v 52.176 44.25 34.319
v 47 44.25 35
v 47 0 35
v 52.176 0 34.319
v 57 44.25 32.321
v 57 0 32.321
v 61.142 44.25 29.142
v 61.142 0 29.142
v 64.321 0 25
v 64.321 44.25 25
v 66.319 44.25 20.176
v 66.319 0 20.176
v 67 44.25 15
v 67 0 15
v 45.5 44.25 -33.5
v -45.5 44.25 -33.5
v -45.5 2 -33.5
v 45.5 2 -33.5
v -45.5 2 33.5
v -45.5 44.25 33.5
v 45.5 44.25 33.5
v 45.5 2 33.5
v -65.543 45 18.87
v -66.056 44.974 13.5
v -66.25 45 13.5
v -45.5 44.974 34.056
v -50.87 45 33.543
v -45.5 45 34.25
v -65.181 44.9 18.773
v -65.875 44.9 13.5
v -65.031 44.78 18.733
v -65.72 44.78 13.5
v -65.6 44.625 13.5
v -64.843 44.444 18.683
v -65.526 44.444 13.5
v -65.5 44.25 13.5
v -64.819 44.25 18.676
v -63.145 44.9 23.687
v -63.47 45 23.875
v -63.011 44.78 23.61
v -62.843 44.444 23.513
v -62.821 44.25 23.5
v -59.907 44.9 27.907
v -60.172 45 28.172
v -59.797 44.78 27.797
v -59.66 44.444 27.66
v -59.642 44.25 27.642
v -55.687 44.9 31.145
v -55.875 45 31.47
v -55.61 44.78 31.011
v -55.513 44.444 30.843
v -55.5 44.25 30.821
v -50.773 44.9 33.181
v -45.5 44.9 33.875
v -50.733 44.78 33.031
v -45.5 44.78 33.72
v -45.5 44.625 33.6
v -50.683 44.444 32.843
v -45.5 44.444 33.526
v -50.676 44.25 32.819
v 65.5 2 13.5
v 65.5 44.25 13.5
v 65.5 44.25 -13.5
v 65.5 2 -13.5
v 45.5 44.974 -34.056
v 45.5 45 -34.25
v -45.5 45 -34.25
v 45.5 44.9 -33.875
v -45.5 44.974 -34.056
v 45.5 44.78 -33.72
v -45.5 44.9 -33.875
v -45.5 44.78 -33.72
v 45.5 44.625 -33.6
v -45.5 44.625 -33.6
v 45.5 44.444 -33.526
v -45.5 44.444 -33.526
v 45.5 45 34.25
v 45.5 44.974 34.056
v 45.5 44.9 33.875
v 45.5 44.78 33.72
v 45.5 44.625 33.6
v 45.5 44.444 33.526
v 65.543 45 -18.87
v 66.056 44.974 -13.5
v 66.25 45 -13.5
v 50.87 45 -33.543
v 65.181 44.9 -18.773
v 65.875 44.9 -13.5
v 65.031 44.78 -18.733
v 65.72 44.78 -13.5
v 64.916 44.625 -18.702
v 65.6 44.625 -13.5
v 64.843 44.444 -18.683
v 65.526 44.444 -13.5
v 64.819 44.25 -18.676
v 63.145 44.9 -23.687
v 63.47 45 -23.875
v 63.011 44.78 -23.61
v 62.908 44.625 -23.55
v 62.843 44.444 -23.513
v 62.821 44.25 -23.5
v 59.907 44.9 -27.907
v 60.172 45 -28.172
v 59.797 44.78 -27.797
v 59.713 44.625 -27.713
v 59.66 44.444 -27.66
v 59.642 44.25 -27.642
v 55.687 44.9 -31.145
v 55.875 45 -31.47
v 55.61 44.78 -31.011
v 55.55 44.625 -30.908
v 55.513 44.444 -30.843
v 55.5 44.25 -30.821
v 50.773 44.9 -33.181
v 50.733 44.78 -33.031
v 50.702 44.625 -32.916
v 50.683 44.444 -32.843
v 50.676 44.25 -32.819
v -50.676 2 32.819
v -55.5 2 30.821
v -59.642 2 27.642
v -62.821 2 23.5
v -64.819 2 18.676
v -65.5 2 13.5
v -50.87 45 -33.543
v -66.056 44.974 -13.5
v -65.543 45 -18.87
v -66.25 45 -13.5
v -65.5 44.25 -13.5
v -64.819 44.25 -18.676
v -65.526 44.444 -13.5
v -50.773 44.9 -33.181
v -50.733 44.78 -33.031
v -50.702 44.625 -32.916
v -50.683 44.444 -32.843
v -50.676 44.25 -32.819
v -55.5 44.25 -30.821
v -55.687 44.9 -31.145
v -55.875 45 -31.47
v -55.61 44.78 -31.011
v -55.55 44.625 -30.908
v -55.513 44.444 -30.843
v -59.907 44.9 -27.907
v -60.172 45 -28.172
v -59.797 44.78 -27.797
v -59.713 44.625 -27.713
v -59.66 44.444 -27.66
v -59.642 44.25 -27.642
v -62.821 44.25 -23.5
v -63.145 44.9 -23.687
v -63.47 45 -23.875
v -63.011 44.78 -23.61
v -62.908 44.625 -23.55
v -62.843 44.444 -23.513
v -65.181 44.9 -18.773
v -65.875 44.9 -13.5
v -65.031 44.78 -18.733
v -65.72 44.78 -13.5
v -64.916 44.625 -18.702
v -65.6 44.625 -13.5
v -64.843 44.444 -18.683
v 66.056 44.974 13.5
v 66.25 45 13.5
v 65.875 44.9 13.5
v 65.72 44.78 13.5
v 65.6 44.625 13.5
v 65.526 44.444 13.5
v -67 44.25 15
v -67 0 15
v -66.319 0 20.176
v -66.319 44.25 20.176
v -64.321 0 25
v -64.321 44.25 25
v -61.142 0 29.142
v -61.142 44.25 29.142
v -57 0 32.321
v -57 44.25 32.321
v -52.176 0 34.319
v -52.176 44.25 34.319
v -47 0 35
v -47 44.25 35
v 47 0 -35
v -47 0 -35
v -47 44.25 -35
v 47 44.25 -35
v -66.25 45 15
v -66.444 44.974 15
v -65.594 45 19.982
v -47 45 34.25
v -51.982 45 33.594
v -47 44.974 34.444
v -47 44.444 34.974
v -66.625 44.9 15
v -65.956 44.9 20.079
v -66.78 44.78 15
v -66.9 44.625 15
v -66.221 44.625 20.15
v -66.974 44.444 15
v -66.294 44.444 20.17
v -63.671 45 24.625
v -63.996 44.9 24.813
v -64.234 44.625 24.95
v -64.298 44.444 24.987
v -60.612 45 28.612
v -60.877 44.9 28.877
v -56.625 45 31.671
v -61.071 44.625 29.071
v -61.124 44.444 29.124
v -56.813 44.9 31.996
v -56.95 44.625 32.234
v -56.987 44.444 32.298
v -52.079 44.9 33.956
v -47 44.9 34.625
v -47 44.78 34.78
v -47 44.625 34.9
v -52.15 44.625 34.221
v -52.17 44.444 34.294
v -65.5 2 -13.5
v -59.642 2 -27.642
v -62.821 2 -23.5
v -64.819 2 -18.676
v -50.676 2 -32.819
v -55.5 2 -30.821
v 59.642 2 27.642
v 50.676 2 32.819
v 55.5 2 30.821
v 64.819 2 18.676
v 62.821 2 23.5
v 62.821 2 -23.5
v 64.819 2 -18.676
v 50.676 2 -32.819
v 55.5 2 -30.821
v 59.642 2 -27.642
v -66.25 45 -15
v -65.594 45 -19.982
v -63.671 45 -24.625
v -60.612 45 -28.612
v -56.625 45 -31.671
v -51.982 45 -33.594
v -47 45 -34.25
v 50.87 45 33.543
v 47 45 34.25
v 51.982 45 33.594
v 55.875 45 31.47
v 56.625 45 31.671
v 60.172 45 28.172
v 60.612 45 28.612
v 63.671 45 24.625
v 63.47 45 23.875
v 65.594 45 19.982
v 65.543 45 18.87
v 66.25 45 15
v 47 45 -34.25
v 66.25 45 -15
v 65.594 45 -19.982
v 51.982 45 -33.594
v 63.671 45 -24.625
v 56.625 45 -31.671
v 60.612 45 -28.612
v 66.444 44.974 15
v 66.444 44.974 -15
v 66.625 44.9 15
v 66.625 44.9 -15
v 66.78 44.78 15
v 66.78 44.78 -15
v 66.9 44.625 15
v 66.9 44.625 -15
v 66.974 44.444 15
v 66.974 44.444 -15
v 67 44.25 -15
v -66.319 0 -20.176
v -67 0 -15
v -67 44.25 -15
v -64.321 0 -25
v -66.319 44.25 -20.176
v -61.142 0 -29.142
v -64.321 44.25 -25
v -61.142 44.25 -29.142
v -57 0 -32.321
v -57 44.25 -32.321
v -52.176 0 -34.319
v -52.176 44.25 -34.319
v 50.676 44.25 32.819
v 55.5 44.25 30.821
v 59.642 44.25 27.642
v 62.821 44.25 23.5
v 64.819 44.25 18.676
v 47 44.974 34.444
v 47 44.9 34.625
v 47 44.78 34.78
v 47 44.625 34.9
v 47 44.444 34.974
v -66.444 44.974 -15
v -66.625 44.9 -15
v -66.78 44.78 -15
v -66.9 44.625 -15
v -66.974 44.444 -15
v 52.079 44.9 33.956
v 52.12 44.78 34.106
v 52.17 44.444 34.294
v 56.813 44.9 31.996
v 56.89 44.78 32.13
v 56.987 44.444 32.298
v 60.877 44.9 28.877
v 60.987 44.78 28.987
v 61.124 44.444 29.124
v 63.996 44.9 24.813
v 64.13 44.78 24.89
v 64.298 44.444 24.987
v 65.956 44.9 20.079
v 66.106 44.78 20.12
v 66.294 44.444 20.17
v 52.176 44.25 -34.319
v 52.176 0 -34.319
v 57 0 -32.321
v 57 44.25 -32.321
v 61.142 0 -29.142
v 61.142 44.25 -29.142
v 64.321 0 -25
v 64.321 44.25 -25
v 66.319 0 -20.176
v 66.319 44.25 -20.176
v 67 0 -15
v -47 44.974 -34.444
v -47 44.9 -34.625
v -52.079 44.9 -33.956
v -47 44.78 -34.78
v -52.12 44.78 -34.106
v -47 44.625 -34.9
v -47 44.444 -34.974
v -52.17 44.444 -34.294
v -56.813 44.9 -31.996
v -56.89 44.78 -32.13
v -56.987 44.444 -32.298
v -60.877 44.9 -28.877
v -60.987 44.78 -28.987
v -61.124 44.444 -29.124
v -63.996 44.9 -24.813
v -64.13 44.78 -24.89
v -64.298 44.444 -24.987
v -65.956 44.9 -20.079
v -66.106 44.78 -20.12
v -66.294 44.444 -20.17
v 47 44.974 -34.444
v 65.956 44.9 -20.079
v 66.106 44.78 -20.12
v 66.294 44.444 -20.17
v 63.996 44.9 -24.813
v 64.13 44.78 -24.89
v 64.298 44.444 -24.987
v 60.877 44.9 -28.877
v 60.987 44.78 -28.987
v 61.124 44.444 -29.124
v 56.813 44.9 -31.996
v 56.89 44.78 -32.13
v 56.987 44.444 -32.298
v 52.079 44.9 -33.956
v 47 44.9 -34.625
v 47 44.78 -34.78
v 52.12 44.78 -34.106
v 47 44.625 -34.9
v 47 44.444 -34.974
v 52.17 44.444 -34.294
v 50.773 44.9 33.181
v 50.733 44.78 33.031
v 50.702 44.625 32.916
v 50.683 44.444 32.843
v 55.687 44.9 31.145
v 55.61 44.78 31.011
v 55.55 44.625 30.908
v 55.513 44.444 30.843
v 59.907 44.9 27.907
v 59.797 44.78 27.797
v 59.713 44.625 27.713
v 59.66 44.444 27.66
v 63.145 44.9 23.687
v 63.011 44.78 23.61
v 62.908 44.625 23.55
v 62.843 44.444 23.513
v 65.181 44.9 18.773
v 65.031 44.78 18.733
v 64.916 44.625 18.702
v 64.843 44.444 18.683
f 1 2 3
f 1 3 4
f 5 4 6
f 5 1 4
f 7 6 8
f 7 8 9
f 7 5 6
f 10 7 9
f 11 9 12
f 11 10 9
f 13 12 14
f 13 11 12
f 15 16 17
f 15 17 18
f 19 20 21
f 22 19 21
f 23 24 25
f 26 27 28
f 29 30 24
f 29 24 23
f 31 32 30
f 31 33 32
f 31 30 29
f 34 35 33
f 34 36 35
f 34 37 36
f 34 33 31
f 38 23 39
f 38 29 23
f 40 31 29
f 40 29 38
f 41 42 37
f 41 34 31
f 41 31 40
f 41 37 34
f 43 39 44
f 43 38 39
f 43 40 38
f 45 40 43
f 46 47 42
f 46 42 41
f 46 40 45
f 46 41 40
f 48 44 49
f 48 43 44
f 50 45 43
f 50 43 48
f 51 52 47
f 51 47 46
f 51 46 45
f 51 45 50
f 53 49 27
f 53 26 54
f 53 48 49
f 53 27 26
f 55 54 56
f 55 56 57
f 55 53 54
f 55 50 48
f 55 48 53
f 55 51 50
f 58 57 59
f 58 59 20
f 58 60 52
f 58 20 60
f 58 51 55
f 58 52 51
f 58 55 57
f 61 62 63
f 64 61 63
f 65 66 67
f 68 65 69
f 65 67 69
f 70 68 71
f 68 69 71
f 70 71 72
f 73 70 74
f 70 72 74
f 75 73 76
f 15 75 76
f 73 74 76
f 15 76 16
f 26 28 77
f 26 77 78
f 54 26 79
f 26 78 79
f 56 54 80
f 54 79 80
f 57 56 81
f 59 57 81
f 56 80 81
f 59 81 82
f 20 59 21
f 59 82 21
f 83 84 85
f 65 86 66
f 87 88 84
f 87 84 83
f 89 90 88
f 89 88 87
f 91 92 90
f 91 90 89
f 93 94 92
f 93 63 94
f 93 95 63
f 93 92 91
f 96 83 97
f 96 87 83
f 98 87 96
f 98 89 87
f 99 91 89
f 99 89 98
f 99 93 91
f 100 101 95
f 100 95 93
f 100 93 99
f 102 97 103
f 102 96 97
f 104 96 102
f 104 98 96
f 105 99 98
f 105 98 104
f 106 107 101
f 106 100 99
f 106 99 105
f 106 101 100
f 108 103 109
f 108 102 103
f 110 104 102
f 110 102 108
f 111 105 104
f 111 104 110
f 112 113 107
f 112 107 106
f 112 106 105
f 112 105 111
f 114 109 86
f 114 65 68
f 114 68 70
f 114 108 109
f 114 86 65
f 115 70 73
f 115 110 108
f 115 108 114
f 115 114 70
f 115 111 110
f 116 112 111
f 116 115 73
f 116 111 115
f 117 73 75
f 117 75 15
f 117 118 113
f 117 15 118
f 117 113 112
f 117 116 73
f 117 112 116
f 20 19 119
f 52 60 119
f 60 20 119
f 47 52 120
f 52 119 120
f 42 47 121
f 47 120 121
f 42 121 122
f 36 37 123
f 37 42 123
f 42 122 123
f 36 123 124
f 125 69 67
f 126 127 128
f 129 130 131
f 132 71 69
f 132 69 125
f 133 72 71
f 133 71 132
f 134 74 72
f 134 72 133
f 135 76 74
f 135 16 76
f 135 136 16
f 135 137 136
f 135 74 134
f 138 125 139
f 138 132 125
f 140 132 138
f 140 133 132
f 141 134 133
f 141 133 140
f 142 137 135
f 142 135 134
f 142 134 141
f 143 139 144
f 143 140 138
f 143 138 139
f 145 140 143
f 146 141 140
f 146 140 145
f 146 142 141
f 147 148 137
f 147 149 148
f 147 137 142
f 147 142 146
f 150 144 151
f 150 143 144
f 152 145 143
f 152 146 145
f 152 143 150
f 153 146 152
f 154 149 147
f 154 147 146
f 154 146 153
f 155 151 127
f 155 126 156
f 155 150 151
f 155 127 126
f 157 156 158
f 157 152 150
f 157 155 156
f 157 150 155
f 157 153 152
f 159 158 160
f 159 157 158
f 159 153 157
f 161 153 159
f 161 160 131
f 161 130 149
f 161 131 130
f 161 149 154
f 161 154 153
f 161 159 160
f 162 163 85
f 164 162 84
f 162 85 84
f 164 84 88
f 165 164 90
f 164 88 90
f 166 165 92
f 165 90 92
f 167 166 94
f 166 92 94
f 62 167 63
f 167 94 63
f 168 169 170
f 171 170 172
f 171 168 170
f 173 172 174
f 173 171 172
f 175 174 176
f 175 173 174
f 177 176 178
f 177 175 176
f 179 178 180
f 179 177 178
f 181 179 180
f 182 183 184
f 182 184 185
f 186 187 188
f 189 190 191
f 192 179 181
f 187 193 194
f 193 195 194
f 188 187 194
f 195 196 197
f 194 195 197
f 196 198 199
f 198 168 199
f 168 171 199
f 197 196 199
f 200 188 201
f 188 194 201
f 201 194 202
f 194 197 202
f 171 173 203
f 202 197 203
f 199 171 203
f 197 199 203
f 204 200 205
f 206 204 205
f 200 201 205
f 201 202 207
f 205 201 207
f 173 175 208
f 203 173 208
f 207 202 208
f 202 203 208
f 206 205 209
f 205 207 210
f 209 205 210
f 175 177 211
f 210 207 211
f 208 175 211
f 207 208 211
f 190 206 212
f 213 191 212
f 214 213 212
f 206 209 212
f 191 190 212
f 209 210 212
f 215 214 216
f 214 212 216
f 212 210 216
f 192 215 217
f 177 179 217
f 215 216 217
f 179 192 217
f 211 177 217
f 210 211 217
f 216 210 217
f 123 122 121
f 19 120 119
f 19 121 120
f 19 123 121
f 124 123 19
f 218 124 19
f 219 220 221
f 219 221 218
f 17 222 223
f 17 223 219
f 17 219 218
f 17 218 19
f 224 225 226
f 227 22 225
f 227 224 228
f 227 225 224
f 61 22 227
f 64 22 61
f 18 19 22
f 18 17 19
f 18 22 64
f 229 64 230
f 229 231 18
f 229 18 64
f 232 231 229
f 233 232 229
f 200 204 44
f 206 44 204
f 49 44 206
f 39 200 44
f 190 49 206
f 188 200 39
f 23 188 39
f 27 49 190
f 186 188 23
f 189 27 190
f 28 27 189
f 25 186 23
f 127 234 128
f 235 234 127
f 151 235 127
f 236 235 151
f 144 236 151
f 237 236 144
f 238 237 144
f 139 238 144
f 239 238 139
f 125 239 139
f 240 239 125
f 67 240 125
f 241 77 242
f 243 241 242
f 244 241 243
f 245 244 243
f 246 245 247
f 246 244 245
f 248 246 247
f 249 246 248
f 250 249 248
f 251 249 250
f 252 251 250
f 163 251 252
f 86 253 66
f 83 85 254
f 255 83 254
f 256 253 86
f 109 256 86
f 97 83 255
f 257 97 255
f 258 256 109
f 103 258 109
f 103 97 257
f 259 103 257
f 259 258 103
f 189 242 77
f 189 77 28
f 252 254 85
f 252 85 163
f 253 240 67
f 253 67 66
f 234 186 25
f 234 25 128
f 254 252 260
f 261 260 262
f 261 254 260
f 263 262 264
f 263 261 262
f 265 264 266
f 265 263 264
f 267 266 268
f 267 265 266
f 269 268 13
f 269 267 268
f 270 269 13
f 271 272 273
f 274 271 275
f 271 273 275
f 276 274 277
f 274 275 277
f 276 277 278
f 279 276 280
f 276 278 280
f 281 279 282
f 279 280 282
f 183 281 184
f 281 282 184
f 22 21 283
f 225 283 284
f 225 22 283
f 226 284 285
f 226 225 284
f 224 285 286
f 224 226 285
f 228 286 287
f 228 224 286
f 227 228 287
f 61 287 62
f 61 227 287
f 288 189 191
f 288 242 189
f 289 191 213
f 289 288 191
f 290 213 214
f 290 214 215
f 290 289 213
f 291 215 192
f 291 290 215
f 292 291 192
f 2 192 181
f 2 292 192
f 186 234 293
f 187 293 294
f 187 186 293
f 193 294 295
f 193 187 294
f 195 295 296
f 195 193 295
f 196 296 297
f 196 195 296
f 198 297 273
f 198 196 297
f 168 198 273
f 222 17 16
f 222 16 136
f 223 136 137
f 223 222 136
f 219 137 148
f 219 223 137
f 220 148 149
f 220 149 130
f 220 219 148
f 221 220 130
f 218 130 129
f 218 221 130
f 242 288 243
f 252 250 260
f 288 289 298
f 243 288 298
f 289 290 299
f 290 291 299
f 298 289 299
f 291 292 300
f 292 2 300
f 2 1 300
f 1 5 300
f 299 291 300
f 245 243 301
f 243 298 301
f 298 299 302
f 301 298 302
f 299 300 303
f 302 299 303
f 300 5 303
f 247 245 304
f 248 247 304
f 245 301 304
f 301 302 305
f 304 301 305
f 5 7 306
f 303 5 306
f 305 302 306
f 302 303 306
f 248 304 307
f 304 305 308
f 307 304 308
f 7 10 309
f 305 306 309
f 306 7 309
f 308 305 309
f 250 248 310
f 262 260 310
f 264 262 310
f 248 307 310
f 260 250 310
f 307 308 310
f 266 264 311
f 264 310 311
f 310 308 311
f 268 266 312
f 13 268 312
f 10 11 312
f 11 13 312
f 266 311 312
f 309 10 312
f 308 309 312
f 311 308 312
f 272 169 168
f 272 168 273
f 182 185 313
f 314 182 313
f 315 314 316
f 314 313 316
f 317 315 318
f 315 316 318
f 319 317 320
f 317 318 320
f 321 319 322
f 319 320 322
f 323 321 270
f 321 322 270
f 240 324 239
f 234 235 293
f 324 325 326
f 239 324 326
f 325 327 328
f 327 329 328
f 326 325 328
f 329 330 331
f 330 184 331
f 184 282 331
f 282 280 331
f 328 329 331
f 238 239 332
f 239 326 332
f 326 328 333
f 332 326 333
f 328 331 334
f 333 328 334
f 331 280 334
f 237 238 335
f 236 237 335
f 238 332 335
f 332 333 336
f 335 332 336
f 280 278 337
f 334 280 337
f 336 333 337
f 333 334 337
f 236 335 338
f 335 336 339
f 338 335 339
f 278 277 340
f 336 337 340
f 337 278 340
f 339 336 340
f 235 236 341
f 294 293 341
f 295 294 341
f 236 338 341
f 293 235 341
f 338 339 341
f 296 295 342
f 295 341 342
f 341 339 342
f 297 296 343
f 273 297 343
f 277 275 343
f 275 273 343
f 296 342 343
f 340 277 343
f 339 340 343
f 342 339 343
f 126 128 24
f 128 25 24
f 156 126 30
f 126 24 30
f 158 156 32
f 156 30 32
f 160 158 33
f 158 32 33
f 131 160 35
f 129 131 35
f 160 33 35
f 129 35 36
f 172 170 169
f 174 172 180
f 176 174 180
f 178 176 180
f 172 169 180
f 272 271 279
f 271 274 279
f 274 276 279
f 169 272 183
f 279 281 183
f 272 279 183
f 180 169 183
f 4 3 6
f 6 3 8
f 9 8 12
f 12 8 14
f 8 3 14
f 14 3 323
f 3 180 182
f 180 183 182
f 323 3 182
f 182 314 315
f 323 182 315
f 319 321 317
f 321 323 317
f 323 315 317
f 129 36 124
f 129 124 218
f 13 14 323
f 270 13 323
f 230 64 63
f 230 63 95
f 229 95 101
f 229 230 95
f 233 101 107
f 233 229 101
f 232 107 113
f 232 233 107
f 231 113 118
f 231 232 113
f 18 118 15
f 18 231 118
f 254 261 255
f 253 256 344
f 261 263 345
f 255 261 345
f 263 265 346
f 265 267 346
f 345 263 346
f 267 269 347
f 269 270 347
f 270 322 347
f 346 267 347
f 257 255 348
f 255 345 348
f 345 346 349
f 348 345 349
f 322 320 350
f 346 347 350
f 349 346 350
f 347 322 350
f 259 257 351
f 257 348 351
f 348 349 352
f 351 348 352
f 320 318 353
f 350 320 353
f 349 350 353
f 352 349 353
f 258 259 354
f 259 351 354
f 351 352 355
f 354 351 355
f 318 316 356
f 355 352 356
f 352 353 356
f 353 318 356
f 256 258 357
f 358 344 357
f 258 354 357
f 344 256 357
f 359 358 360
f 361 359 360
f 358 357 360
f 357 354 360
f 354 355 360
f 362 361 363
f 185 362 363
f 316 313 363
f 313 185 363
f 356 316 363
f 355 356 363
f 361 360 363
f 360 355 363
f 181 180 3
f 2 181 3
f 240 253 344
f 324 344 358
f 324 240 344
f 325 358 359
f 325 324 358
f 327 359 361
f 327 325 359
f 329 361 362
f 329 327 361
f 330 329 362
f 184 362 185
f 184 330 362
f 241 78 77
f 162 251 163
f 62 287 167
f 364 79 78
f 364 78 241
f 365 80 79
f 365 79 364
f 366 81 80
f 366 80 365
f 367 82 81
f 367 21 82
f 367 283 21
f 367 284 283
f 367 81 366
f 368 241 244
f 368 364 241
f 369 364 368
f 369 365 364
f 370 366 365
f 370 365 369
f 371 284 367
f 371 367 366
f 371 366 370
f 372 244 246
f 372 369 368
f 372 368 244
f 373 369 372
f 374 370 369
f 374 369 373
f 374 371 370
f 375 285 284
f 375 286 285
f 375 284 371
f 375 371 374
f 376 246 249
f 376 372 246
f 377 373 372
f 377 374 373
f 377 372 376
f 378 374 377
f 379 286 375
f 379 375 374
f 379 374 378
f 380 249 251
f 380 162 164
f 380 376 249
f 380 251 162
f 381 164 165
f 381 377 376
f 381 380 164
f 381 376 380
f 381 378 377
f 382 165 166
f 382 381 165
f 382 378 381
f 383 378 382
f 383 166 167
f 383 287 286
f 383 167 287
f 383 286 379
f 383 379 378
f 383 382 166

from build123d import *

# Parameters (mm, degrees)
SKETCH_1_W          = 134
SKETCH_1_H          = 70
EXTRUDE_1_DEPTH     = 45
SKETCH_2_W          = 131
SKETCH_2_H          = 67
CUT_EXTRUDE_1_DEPTH = 43
FILLET_1_R          = 20
FILLET_2_R          = 0.75


with BuildPart() as part:
    # 草图1 → 凸台-拉伸1 (new body)
    with BuildSketch(Plane(origin=(0, 0, 0), x_dir=(1, 0, 0), z_dir=(0, 1, 0))):
        Rectangle(SKETCH_1_W, SKETCH_1_H)
    extrude(amount=EXTRUDE_1_DEPTH)

    # 草图2 → 切除-拉伸1 (cut)
    with BuildSketch(Plane(origin=(0, 45, 0), x_dir=(1, 0, 0), z_dir=(0, 1, 0))):
        Rectangle(SKETCH_2_W, SKETCH_2_H)
    extrude(amount=-CUT_EXTRUDE_1_DEPTH, mode=Mode.SUBTRACT)

    # 圆角1
    fillet_1_edges = [part.edges().sort_by_distance(p)[0] for p in [
        (-65.5, 23.5, 33.5),
        (65.5, 23.5, 33.5),
        (65.5, 23.5, -33.5),
        (-65.5, 23.5, -33.5),
        (-67, 22.5, 35),
        (67, 22.5, 35),
        (67, 22.5, -35),
        (-67, 22.5, -35),
    ]]
    fillet(fillet_1_edges, radius=FILLET_1_R)

    # 圆角2
    fillet_2_edges = [part.edges().sort_by_distance(p)[0] for p in [
        (0, 45, 33.5),
        (-65.5, 45, 0),
        (0, 45, 35),
        (-67, 45, 0),
        (0, 45, -35),
        (0, 45, -33.5),
        (65.5, 45, 0),
        (67, 45, 0),
        (-59.642135624, 45, 27.642135624),
        (-59.642135624, 45, -27.642135624),
        (59.642135624, 45, -27.642135624),
        (59.642135624, 45, 27.642135624),
        (61.142135624, 45, -29.142135624),
        (61.142135624, 45, 29.142135624),
        (-61.142135624, 45, -29.142135624),
        (-61.142135624, 45, 29.142135624),
    ]]
    fillet(fillet_2_edges, radius=FILLET_2_R - 0.0001)  # a hair under: the kernel refuses the full size


solid = part.part
